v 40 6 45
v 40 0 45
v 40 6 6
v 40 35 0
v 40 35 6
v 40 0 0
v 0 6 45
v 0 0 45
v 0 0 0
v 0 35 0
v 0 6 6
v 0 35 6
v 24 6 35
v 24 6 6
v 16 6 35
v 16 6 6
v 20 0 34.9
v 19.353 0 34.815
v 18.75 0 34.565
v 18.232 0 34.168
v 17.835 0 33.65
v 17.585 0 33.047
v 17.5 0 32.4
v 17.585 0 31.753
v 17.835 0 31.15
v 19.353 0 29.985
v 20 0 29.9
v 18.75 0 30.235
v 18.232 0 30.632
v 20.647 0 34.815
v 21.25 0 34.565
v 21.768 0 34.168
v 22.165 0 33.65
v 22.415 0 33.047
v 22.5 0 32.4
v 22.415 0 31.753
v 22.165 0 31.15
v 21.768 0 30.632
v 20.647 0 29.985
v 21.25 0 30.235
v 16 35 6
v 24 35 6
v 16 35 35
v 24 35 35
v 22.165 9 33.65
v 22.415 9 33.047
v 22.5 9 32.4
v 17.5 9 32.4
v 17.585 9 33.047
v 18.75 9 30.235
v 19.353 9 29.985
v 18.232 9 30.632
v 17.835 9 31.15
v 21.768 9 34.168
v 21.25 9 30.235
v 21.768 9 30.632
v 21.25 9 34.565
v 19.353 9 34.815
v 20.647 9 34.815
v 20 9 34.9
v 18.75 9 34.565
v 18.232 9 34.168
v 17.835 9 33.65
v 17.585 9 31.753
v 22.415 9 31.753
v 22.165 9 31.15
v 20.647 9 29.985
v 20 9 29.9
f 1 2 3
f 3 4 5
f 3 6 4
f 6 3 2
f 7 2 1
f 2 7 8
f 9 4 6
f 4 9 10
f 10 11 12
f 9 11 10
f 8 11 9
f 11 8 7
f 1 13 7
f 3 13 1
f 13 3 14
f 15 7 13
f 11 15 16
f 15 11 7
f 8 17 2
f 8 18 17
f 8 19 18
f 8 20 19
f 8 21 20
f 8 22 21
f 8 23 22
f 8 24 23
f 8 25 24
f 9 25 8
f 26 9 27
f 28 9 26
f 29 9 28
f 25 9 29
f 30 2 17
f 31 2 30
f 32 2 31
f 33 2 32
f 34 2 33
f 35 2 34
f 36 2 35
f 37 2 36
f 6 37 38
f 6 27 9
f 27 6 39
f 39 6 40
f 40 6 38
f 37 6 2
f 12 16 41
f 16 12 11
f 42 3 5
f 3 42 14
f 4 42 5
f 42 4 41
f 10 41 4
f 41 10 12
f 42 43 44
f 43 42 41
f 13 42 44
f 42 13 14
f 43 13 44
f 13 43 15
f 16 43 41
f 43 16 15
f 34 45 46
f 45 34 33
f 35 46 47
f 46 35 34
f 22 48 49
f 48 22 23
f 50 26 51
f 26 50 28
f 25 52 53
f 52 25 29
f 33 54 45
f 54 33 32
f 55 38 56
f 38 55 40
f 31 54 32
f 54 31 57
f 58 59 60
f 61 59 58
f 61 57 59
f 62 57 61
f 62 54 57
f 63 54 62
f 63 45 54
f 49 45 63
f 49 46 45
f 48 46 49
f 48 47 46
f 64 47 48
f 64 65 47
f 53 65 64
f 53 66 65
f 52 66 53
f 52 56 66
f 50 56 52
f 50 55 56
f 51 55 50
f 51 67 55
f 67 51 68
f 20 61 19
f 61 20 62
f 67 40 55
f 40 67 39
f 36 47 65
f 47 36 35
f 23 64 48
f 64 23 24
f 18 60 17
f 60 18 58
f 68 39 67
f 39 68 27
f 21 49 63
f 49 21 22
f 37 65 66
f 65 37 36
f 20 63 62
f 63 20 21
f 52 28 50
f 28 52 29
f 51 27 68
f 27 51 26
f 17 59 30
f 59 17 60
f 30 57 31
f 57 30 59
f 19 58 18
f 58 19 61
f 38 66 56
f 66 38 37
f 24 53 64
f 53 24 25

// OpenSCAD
// Кронштейн полки — пример для nexus optimize
width = 40;          // ширина
height = 45;         // высота стойки
thickness = 6.0;     // толщина стенки  <- силовой параметр
rib = 8.0;           // ребро жёсткости <- силовой параметр
leg = 35;            // вылет полки
hole_d = 5;          // отверстие крепления

difference() {
  union() {
    cube([width, thickness, height]);
    cube([width, leg, thickness]);
    translate([width/2 - rib/2, 0, 0]) cube([rib, leg, leg]);
  }
  translate([width/2, thickness/2, height*0.72]) rotate([90,0,0])
    translate([0,0,-thickness]) cylinder(h=thickness*3, r=hole_d/2, $fn=24);
}
